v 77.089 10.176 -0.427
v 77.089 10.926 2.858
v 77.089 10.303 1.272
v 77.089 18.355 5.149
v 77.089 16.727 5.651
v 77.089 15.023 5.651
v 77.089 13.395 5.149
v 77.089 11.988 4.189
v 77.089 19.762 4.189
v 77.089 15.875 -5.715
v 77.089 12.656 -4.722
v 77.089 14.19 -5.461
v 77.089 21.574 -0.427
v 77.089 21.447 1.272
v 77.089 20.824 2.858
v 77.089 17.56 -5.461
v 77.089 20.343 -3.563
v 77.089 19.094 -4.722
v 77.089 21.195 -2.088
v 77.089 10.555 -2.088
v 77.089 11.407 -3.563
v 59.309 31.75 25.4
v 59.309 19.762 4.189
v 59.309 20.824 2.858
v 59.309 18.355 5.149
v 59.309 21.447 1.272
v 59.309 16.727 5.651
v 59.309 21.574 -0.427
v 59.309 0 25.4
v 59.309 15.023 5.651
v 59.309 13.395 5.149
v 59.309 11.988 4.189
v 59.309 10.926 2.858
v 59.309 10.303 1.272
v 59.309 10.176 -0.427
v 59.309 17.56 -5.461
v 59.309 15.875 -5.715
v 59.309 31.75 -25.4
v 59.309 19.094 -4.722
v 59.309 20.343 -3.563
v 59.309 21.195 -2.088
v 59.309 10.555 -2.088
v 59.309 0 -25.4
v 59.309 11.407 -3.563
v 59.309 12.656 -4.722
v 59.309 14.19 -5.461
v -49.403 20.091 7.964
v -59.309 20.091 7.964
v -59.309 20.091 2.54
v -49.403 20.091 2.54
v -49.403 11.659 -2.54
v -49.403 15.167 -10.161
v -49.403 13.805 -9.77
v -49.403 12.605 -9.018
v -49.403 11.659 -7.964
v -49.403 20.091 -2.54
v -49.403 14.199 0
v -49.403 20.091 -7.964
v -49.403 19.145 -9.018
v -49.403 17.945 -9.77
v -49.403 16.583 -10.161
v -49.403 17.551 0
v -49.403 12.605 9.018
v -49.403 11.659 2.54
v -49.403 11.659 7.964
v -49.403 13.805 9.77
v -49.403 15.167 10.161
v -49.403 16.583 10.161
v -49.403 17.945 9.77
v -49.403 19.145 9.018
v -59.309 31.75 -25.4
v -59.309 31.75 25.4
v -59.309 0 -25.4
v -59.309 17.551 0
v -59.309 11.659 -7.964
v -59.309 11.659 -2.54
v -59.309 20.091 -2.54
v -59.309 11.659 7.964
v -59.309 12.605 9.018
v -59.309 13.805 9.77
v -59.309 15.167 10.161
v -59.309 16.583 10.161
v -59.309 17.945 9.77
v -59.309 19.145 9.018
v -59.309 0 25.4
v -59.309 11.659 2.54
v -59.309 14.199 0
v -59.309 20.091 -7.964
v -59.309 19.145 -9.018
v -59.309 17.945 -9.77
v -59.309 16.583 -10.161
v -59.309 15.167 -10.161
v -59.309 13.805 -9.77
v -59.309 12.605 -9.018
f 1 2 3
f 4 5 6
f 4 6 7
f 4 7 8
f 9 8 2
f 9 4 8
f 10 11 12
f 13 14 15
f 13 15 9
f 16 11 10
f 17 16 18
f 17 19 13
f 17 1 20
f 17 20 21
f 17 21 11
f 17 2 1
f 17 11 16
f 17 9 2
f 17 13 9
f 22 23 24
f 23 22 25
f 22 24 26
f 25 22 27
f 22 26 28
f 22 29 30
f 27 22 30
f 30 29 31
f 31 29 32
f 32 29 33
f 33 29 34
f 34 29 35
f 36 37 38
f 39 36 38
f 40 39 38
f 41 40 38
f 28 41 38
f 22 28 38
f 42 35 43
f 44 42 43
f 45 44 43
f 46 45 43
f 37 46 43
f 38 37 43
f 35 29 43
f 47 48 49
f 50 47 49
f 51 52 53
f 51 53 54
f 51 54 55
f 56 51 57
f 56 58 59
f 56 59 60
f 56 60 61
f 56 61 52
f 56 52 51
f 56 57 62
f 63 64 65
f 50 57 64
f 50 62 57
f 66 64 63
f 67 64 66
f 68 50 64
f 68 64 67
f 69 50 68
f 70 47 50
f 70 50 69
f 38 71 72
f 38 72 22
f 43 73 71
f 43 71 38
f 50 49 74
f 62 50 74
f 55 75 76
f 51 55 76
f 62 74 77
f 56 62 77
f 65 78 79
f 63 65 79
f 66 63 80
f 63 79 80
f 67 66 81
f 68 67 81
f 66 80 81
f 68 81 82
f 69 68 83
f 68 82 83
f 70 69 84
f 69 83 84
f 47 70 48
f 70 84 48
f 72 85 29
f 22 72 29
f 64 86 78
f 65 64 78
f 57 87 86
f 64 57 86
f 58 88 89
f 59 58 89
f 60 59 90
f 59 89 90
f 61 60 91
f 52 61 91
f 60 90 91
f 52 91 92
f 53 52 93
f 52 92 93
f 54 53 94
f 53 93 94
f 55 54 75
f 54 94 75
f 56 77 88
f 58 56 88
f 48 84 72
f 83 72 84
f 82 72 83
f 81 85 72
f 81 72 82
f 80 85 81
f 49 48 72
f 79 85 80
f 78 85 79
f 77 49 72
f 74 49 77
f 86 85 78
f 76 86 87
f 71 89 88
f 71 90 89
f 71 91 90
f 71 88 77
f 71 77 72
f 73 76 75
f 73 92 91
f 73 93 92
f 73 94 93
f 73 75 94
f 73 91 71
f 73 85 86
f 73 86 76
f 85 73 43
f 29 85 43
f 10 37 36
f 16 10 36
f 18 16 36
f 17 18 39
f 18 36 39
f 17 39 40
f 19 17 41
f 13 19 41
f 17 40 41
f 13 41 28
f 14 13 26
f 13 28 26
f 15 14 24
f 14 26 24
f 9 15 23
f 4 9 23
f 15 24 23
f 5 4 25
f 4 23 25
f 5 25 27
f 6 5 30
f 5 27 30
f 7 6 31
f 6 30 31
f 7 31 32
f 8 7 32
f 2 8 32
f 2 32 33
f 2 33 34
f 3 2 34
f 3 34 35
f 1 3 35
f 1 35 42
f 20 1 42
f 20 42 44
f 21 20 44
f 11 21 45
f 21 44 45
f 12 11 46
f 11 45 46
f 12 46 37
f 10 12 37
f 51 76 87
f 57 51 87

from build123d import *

# Parameters (mm, degrees)
SKETCH1_W           = 118.618
SKETCH1_H           = 50.8
BOSS_EXTRUDE1_DEPTH = 31.75
SKETCH2_R           = 5.715
BOSS_EXTRUDE2_DEPTH = 17.78
CUT_EXTRUDE1_DEPTH  = 9.906


with BuildPart() as part:
    # Sketch1 → Boss-Extrude1 (new body)
    with BuildSketch(Plane(origin=(0, 0, 0), x_dir=(1, 0, 0), z_dir=(0, 1, 0))):
        Rectangle(SKETCH1_W, SKETCH1_H)
    extrude(amount=BOSS_EXTRUDE1_DEPTH)

    # Sketch2 → Boss-Extrude2 (add)
    with BuildSketch(Plane(origin=(59.309, 0, 0), x_dir=(0, 0, -1), z_dir=(1, 0, 0))):
        with Locations((0, 15.875)):
            Circle(SKETCH2_R)
    extrude(amount=BOSS_EXTRUDE2_DEPTH)

    # Sketch3 → Cut-Extrude1 (cut)
    with BuildSketch(Plane.ZY.offset(59.309)):
        with BuildLine():
            Line((-7.963952601, 11.6586), (-2.54, 11.6586))
            Line((-2.54, 11.6586), (0, 14.1986))
            Line((0, 14.1986), (2.54, 11.6586))
            Line((2.54, 11.6586), (7.963952601, 11.6586))
            ThreePointArc((7.963952601, 11.6586), (10.210514576, 15.875), (7.963952601, 20.0914))
            Line((7.963952601, 20.0914), (2.54, 20.0914))
            Line((2.54, 20.0914), (0, 17.5514))
            Line((0, 17.5514), (-2.54, 20.0914))
            Line((-2.54, 20.0914), (-7.963952601, 20.0914))
            ThreePointArc((-7.963952601, 20.0914), (-10.210514576, 15.875), (-7.963952601, 11.6586))
        make_face()
    extrude(amount=-CUT_EXTRUDE1_DEPTH, mode=Mode.SUBTRACT)


solid = part.part
